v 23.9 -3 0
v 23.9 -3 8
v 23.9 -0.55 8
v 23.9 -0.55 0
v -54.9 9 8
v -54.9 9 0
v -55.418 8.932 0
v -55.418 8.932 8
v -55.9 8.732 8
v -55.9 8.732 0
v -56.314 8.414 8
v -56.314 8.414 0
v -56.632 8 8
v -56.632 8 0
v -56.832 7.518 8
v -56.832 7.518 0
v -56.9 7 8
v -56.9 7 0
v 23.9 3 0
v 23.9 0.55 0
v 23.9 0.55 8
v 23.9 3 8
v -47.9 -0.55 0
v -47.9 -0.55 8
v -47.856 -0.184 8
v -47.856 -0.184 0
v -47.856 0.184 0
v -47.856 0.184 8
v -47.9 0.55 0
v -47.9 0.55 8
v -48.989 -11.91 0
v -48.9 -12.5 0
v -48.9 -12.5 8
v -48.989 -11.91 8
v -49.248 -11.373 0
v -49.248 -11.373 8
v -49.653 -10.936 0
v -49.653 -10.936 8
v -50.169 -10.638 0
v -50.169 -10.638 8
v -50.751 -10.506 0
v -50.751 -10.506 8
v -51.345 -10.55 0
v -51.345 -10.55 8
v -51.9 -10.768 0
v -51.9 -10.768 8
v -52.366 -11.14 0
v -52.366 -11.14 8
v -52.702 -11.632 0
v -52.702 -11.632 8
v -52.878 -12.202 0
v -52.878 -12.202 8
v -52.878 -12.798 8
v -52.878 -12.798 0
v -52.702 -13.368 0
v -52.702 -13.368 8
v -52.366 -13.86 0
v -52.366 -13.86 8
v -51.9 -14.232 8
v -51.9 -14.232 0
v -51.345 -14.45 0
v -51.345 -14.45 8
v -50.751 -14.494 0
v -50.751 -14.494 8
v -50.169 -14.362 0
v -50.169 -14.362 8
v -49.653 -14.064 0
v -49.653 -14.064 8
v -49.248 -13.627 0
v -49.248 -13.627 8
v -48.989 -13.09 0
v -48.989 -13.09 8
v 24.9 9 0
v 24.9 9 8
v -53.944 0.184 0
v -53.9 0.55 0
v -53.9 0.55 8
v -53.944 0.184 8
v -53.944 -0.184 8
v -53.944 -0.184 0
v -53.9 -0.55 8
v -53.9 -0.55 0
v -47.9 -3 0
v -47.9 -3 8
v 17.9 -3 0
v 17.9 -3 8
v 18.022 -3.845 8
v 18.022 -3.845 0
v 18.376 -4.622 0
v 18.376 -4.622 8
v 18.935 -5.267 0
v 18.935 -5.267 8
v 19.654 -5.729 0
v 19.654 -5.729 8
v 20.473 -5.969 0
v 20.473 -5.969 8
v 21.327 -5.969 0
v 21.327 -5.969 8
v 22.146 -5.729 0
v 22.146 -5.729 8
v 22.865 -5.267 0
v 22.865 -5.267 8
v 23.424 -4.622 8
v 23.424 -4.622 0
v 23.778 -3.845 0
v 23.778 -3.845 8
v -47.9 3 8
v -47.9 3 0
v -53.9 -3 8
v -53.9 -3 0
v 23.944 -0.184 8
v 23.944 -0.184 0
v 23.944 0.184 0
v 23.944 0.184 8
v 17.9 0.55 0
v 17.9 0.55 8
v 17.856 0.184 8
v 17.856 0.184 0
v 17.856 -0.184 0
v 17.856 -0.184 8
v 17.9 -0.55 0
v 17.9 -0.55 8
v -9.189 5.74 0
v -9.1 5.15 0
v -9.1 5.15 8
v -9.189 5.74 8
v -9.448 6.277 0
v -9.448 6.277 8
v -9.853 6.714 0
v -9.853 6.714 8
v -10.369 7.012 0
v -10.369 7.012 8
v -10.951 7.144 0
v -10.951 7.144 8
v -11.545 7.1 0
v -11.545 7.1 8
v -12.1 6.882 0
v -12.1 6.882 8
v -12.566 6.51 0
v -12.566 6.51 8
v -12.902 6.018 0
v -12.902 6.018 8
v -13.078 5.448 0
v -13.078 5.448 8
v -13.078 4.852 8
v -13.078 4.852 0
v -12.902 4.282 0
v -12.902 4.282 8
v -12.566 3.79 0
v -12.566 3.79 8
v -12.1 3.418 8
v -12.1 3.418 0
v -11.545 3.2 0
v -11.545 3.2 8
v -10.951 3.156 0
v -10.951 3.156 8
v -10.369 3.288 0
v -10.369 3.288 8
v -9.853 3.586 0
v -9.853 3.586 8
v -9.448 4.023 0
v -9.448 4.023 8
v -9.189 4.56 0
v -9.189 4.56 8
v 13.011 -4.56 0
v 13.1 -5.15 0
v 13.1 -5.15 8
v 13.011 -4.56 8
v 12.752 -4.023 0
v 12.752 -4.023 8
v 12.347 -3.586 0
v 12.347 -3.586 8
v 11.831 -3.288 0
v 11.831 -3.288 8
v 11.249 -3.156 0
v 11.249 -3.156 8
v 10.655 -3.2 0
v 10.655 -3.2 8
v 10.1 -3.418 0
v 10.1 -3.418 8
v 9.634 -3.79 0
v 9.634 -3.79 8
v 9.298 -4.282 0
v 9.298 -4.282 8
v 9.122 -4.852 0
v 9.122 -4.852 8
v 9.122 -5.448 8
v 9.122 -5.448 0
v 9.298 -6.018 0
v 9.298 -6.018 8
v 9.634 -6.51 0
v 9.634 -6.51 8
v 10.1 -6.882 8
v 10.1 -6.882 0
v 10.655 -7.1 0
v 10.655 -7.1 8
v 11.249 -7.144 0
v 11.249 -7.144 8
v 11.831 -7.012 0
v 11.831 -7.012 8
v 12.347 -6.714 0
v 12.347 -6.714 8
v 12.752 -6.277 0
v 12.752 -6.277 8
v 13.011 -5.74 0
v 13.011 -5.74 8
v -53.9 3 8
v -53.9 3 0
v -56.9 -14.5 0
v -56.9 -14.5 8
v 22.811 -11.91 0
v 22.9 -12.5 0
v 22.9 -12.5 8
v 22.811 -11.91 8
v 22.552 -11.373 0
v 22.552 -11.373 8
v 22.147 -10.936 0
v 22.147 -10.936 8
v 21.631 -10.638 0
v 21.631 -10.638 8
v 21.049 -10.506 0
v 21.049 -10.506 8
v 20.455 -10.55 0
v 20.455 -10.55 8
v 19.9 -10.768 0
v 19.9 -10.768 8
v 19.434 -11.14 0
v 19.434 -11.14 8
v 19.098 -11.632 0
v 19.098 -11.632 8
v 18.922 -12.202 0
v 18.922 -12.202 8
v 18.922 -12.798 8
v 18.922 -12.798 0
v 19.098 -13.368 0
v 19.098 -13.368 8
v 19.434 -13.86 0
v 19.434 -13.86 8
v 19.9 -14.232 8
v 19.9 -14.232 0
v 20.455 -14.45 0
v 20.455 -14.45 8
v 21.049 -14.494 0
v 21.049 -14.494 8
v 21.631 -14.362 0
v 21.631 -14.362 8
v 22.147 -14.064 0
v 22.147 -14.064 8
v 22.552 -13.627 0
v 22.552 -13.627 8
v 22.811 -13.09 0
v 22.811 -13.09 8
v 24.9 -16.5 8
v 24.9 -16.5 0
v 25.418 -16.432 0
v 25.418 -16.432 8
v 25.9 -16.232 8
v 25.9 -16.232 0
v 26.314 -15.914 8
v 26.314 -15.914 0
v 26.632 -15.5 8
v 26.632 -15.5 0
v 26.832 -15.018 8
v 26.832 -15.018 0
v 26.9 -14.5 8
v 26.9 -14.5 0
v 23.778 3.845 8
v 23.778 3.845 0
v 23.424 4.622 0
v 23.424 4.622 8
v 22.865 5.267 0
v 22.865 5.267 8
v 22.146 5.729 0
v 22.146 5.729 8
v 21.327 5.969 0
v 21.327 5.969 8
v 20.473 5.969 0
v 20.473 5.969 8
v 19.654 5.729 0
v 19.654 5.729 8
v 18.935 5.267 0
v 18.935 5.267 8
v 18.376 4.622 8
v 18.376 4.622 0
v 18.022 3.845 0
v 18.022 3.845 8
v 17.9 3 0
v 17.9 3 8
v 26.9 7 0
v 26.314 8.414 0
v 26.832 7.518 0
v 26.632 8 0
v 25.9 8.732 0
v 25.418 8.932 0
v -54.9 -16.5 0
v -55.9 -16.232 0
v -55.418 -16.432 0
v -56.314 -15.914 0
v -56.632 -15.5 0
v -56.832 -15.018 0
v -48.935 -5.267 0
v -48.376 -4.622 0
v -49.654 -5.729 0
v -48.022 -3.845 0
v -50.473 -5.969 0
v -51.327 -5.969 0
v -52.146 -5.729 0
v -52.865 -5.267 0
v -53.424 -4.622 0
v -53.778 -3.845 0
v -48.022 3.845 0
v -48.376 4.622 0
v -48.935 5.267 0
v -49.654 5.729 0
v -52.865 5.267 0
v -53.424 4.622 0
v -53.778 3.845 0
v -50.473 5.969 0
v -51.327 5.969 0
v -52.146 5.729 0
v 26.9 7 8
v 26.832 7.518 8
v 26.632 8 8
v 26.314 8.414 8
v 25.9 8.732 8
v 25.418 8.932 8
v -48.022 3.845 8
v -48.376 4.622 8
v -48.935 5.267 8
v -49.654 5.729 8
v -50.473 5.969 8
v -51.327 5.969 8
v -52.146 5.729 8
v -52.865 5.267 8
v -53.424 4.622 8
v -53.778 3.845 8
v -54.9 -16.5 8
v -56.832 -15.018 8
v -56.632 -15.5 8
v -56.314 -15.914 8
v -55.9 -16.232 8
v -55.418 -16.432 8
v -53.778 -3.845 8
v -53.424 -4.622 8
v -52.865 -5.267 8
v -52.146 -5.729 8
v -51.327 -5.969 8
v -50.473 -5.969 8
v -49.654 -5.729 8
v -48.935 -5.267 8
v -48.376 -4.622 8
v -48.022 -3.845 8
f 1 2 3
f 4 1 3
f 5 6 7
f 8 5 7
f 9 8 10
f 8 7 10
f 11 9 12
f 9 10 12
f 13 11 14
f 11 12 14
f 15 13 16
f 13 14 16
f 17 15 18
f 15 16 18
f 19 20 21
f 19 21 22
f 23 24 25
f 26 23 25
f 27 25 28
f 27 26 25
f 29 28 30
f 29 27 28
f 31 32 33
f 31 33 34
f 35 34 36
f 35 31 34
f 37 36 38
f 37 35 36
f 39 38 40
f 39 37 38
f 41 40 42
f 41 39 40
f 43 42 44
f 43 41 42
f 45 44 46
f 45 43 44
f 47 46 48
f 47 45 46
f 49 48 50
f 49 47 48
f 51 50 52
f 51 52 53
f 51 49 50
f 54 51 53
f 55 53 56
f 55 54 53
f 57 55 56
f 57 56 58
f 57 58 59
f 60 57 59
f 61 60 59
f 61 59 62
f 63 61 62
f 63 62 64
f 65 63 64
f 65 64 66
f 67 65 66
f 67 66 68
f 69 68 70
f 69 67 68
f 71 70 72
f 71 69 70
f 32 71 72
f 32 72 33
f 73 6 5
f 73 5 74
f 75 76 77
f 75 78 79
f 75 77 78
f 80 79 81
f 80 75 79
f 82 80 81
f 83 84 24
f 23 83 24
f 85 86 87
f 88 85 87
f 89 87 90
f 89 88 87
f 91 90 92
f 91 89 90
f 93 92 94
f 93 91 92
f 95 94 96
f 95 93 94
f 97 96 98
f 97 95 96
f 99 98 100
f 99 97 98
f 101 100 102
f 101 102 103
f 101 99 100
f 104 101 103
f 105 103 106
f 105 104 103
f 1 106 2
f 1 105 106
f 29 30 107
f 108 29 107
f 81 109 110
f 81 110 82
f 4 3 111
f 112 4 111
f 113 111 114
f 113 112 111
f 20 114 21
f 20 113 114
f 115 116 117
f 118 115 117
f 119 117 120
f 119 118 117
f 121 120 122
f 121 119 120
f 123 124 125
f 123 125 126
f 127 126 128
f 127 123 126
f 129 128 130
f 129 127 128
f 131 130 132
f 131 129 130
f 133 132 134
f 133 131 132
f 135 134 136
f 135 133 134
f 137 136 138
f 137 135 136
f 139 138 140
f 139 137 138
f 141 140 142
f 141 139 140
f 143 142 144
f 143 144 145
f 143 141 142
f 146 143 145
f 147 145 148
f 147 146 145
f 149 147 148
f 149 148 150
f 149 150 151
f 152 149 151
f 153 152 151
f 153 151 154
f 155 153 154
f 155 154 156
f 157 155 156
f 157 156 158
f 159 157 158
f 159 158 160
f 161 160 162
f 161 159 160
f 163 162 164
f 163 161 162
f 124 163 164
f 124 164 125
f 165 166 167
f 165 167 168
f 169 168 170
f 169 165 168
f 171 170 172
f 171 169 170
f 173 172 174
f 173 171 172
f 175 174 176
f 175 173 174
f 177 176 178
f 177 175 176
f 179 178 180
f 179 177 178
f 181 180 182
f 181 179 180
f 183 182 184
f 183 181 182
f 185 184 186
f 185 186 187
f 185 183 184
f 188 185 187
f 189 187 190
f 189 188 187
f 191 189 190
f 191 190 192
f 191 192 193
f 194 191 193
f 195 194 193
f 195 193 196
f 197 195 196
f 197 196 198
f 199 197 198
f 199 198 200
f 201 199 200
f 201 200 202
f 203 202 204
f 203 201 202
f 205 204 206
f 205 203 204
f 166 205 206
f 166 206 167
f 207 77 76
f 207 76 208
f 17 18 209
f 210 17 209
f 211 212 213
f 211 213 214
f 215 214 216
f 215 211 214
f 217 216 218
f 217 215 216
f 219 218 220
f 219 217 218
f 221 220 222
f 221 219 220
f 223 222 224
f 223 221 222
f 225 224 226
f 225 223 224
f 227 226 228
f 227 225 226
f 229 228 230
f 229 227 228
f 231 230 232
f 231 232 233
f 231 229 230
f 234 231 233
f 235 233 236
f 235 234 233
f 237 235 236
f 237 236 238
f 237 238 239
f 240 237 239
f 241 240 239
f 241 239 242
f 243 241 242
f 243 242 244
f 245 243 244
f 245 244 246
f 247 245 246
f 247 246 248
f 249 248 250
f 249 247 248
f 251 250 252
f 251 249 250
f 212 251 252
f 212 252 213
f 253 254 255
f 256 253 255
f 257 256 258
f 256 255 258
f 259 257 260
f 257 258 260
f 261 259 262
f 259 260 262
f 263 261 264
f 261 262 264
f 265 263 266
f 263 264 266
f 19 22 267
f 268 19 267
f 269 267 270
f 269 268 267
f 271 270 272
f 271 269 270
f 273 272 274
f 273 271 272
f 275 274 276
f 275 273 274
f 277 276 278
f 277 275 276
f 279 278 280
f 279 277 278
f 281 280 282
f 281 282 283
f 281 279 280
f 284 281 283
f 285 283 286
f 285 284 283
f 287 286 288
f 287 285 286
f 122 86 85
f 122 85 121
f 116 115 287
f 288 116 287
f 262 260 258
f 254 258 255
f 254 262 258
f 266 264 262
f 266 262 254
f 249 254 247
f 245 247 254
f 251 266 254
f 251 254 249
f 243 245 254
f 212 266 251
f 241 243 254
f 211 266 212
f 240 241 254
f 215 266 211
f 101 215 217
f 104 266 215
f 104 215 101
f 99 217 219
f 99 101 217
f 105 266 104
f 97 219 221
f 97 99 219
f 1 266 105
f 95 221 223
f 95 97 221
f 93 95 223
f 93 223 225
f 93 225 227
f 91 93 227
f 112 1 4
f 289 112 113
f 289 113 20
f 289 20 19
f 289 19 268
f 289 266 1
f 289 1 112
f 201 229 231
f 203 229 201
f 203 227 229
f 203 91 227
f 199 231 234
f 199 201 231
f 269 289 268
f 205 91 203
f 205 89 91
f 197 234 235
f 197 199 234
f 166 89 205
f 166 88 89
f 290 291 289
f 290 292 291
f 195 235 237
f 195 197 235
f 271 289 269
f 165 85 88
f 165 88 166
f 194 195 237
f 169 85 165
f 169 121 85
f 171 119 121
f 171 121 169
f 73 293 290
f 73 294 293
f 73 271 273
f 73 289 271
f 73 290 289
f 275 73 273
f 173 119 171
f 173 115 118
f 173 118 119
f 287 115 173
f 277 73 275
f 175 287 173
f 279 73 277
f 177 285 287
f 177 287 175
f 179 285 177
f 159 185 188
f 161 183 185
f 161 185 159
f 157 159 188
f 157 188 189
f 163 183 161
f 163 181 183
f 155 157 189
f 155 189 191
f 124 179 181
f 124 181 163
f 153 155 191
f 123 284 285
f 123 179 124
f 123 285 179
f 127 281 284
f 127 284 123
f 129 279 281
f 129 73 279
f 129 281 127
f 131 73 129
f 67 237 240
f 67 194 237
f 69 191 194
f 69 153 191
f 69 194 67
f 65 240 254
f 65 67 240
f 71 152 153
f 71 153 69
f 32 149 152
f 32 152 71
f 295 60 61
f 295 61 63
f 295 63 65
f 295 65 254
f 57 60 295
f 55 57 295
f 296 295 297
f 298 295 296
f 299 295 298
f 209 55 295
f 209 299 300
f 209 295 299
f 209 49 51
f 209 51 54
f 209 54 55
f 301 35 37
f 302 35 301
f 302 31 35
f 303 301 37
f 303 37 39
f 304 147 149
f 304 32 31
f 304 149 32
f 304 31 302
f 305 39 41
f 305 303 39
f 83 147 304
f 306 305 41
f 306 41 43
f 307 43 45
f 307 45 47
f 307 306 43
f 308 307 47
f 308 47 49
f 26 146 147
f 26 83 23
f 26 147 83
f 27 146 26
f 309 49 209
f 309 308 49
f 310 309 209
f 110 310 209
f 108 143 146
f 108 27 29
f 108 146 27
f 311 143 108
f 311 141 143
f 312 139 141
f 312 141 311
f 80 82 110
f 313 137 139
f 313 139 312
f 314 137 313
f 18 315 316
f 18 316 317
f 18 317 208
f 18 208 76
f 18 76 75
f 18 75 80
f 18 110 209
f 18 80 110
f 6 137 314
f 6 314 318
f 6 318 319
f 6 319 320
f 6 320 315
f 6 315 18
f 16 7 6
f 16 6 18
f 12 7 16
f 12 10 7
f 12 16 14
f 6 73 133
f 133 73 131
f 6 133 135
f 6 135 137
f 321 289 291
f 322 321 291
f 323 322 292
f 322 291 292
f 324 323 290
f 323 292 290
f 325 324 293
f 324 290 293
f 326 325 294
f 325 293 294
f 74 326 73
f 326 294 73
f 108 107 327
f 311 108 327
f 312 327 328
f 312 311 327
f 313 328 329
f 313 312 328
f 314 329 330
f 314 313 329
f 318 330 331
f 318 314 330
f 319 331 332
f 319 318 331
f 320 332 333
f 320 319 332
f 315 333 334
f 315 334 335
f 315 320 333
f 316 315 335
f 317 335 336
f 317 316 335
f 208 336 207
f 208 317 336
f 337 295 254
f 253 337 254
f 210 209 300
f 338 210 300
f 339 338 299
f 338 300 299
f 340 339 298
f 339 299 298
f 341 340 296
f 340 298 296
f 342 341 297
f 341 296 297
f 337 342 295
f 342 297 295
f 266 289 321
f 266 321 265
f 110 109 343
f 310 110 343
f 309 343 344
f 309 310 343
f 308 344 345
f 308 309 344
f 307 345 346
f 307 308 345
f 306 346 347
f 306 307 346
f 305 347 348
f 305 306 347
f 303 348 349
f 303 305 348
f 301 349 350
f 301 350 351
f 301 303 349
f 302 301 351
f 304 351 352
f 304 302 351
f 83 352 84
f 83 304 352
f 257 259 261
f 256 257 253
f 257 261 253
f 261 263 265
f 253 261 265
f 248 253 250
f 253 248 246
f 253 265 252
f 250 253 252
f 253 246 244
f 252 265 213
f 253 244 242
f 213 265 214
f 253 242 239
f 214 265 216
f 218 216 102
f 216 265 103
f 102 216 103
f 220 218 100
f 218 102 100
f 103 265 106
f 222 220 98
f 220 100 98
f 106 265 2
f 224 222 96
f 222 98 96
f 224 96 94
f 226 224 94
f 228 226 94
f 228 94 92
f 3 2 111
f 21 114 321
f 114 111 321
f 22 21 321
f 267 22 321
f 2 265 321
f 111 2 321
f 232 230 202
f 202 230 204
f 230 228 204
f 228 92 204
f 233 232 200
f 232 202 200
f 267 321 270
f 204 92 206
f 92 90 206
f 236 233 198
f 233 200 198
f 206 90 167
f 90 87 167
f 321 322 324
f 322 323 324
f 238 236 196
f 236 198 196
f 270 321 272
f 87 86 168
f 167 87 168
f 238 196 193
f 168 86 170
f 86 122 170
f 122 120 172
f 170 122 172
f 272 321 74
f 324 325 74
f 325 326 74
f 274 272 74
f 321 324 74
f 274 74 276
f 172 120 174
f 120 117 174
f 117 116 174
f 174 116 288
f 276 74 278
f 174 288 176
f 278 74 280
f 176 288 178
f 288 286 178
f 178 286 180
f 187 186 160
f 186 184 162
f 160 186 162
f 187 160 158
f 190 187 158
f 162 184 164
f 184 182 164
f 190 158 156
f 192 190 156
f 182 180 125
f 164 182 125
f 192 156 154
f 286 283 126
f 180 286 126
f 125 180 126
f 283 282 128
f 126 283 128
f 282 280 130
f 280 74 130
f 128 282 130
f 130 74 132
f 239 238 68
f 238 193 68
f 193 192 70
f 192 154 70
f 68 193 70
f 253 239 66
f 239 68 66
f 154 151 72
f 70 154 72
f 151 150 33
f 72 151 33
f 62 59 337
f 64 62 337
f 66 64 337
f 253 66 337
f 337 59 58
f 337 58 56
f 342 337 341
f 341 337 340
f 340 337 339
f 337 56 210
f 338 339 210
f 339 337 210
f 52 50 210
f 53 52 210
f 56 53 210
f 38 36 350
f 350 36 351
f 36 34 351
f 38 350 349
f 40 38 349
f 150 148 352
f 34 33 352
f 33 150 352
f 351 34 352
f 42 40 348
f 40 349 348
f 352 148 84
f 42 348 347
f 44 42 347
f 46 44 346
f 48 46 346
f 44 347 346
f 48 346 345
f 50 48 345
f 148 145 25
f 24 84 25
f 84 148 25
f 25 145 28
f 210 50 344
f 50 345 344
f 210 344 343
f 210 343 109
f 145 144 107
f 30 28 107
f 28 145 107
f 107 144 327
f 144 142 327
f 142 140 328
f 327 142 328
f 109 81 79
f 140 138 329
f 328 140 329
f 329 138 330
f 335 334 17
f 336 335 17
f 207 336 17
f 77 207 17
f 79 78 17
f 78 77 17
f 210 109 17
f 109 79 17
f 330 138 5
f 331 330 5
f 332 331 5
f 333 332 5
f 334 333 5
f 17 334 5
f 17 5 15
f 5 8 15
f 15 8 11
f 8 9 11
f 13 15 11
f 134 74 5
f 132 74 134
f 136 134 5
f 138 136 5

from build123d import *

# Parameters (mm, degrees)
SKETCH_R          = 2
PAD_DEPTH         = 8
SKETCH001_R       = 3.05
POCKET_DEPTH      = 0.001
POCKET_DEPTH_BACK = 8.001


with BuildPart() as part:
    # Sketch → Pad (new body)
    with BuildSketch(Plane.XY):
        with BuildLine():
            Line((-54.9, 9), (24.9, 9))
            ThreePointArc((26.9, 7), (26.314214, 8.414214), (24.9, 9))
            Line((26.9, 7), (26.9, -14.5))
            ThreePointArc((24.9, -16.5), (26.314214, -15.914214), (26.9, -14.5))
            Line((-54.9, -16.5), (24.9, -16.5))
            ThreePointArc((-56.9, -14.5), (-56.314214, -15.914214), (-54.9, -16.5))
            Line((-56.9, 7), (-56.9, -14.5))
            ThreePointArc((-54.9, 9), (-56.314214, 8.414214), (-56.9, 7))
        make_face()
        with Locations((-11.1, 5.15)):
            Circle(SKETCH_R, mode=Mode.SUBTRACT)
        with Locations((11.1, -5.15)):
            Circle(SKETCH_R, mode=Mode.SUBTRACT)
        with Locations((-50.9, -12.5)):
            Circle(SKETCH_R, mode=Mode.SUBTRACT)
        with Locations((20.9, -12.5)):
            Circle(SKETCH_R, mode=Mode.SUBTRACT)
        with BuildLine():
            ThreePointArc((-53.9, -3), (-50.9, -6), (-47.9, -3))
            Line((-47.9, -3), (-47.9, 3))
            ThreePointArc((-47.9, 3), (-50.9, 6), (-53.9, 3))
            Line((-53.9, -3), (-53.9, 3))
        make_face(mode=Mode.SUBTRACT)
        with BuildLine():
            ThreePointArc((17.9, -3), (20.9, -6), (23.9, -3))
            Line((23.9, -3), (23.9, 3))
            ThreePointArc((23.9, 3), (20.9, 6), (17.9, 3))
            Line((17.9, -3), (17.9, 3))
        make_face(mode=Mode.SUBTRACT)
    extrude(amount=PAD_DEPTH)

    # Sketch001 → Pocket (cut, two sides)
    with BuildSketch(Plane.XY) as pocket_sk:
        with Locations((-50.9, 0)):
            Circle(SKETCH001_R)
        with Locations((20.9, 0)):
            Circle(SKETCH001_R)
    extrude(amount=-POCKET_DEPTH, mode=Mode.SUBTRACT)
    extrude(pocket_sk.sketch, amount=POCKET_DEPTH_BACK, mode=Mode.SUBTRACT)


solid = part.part
